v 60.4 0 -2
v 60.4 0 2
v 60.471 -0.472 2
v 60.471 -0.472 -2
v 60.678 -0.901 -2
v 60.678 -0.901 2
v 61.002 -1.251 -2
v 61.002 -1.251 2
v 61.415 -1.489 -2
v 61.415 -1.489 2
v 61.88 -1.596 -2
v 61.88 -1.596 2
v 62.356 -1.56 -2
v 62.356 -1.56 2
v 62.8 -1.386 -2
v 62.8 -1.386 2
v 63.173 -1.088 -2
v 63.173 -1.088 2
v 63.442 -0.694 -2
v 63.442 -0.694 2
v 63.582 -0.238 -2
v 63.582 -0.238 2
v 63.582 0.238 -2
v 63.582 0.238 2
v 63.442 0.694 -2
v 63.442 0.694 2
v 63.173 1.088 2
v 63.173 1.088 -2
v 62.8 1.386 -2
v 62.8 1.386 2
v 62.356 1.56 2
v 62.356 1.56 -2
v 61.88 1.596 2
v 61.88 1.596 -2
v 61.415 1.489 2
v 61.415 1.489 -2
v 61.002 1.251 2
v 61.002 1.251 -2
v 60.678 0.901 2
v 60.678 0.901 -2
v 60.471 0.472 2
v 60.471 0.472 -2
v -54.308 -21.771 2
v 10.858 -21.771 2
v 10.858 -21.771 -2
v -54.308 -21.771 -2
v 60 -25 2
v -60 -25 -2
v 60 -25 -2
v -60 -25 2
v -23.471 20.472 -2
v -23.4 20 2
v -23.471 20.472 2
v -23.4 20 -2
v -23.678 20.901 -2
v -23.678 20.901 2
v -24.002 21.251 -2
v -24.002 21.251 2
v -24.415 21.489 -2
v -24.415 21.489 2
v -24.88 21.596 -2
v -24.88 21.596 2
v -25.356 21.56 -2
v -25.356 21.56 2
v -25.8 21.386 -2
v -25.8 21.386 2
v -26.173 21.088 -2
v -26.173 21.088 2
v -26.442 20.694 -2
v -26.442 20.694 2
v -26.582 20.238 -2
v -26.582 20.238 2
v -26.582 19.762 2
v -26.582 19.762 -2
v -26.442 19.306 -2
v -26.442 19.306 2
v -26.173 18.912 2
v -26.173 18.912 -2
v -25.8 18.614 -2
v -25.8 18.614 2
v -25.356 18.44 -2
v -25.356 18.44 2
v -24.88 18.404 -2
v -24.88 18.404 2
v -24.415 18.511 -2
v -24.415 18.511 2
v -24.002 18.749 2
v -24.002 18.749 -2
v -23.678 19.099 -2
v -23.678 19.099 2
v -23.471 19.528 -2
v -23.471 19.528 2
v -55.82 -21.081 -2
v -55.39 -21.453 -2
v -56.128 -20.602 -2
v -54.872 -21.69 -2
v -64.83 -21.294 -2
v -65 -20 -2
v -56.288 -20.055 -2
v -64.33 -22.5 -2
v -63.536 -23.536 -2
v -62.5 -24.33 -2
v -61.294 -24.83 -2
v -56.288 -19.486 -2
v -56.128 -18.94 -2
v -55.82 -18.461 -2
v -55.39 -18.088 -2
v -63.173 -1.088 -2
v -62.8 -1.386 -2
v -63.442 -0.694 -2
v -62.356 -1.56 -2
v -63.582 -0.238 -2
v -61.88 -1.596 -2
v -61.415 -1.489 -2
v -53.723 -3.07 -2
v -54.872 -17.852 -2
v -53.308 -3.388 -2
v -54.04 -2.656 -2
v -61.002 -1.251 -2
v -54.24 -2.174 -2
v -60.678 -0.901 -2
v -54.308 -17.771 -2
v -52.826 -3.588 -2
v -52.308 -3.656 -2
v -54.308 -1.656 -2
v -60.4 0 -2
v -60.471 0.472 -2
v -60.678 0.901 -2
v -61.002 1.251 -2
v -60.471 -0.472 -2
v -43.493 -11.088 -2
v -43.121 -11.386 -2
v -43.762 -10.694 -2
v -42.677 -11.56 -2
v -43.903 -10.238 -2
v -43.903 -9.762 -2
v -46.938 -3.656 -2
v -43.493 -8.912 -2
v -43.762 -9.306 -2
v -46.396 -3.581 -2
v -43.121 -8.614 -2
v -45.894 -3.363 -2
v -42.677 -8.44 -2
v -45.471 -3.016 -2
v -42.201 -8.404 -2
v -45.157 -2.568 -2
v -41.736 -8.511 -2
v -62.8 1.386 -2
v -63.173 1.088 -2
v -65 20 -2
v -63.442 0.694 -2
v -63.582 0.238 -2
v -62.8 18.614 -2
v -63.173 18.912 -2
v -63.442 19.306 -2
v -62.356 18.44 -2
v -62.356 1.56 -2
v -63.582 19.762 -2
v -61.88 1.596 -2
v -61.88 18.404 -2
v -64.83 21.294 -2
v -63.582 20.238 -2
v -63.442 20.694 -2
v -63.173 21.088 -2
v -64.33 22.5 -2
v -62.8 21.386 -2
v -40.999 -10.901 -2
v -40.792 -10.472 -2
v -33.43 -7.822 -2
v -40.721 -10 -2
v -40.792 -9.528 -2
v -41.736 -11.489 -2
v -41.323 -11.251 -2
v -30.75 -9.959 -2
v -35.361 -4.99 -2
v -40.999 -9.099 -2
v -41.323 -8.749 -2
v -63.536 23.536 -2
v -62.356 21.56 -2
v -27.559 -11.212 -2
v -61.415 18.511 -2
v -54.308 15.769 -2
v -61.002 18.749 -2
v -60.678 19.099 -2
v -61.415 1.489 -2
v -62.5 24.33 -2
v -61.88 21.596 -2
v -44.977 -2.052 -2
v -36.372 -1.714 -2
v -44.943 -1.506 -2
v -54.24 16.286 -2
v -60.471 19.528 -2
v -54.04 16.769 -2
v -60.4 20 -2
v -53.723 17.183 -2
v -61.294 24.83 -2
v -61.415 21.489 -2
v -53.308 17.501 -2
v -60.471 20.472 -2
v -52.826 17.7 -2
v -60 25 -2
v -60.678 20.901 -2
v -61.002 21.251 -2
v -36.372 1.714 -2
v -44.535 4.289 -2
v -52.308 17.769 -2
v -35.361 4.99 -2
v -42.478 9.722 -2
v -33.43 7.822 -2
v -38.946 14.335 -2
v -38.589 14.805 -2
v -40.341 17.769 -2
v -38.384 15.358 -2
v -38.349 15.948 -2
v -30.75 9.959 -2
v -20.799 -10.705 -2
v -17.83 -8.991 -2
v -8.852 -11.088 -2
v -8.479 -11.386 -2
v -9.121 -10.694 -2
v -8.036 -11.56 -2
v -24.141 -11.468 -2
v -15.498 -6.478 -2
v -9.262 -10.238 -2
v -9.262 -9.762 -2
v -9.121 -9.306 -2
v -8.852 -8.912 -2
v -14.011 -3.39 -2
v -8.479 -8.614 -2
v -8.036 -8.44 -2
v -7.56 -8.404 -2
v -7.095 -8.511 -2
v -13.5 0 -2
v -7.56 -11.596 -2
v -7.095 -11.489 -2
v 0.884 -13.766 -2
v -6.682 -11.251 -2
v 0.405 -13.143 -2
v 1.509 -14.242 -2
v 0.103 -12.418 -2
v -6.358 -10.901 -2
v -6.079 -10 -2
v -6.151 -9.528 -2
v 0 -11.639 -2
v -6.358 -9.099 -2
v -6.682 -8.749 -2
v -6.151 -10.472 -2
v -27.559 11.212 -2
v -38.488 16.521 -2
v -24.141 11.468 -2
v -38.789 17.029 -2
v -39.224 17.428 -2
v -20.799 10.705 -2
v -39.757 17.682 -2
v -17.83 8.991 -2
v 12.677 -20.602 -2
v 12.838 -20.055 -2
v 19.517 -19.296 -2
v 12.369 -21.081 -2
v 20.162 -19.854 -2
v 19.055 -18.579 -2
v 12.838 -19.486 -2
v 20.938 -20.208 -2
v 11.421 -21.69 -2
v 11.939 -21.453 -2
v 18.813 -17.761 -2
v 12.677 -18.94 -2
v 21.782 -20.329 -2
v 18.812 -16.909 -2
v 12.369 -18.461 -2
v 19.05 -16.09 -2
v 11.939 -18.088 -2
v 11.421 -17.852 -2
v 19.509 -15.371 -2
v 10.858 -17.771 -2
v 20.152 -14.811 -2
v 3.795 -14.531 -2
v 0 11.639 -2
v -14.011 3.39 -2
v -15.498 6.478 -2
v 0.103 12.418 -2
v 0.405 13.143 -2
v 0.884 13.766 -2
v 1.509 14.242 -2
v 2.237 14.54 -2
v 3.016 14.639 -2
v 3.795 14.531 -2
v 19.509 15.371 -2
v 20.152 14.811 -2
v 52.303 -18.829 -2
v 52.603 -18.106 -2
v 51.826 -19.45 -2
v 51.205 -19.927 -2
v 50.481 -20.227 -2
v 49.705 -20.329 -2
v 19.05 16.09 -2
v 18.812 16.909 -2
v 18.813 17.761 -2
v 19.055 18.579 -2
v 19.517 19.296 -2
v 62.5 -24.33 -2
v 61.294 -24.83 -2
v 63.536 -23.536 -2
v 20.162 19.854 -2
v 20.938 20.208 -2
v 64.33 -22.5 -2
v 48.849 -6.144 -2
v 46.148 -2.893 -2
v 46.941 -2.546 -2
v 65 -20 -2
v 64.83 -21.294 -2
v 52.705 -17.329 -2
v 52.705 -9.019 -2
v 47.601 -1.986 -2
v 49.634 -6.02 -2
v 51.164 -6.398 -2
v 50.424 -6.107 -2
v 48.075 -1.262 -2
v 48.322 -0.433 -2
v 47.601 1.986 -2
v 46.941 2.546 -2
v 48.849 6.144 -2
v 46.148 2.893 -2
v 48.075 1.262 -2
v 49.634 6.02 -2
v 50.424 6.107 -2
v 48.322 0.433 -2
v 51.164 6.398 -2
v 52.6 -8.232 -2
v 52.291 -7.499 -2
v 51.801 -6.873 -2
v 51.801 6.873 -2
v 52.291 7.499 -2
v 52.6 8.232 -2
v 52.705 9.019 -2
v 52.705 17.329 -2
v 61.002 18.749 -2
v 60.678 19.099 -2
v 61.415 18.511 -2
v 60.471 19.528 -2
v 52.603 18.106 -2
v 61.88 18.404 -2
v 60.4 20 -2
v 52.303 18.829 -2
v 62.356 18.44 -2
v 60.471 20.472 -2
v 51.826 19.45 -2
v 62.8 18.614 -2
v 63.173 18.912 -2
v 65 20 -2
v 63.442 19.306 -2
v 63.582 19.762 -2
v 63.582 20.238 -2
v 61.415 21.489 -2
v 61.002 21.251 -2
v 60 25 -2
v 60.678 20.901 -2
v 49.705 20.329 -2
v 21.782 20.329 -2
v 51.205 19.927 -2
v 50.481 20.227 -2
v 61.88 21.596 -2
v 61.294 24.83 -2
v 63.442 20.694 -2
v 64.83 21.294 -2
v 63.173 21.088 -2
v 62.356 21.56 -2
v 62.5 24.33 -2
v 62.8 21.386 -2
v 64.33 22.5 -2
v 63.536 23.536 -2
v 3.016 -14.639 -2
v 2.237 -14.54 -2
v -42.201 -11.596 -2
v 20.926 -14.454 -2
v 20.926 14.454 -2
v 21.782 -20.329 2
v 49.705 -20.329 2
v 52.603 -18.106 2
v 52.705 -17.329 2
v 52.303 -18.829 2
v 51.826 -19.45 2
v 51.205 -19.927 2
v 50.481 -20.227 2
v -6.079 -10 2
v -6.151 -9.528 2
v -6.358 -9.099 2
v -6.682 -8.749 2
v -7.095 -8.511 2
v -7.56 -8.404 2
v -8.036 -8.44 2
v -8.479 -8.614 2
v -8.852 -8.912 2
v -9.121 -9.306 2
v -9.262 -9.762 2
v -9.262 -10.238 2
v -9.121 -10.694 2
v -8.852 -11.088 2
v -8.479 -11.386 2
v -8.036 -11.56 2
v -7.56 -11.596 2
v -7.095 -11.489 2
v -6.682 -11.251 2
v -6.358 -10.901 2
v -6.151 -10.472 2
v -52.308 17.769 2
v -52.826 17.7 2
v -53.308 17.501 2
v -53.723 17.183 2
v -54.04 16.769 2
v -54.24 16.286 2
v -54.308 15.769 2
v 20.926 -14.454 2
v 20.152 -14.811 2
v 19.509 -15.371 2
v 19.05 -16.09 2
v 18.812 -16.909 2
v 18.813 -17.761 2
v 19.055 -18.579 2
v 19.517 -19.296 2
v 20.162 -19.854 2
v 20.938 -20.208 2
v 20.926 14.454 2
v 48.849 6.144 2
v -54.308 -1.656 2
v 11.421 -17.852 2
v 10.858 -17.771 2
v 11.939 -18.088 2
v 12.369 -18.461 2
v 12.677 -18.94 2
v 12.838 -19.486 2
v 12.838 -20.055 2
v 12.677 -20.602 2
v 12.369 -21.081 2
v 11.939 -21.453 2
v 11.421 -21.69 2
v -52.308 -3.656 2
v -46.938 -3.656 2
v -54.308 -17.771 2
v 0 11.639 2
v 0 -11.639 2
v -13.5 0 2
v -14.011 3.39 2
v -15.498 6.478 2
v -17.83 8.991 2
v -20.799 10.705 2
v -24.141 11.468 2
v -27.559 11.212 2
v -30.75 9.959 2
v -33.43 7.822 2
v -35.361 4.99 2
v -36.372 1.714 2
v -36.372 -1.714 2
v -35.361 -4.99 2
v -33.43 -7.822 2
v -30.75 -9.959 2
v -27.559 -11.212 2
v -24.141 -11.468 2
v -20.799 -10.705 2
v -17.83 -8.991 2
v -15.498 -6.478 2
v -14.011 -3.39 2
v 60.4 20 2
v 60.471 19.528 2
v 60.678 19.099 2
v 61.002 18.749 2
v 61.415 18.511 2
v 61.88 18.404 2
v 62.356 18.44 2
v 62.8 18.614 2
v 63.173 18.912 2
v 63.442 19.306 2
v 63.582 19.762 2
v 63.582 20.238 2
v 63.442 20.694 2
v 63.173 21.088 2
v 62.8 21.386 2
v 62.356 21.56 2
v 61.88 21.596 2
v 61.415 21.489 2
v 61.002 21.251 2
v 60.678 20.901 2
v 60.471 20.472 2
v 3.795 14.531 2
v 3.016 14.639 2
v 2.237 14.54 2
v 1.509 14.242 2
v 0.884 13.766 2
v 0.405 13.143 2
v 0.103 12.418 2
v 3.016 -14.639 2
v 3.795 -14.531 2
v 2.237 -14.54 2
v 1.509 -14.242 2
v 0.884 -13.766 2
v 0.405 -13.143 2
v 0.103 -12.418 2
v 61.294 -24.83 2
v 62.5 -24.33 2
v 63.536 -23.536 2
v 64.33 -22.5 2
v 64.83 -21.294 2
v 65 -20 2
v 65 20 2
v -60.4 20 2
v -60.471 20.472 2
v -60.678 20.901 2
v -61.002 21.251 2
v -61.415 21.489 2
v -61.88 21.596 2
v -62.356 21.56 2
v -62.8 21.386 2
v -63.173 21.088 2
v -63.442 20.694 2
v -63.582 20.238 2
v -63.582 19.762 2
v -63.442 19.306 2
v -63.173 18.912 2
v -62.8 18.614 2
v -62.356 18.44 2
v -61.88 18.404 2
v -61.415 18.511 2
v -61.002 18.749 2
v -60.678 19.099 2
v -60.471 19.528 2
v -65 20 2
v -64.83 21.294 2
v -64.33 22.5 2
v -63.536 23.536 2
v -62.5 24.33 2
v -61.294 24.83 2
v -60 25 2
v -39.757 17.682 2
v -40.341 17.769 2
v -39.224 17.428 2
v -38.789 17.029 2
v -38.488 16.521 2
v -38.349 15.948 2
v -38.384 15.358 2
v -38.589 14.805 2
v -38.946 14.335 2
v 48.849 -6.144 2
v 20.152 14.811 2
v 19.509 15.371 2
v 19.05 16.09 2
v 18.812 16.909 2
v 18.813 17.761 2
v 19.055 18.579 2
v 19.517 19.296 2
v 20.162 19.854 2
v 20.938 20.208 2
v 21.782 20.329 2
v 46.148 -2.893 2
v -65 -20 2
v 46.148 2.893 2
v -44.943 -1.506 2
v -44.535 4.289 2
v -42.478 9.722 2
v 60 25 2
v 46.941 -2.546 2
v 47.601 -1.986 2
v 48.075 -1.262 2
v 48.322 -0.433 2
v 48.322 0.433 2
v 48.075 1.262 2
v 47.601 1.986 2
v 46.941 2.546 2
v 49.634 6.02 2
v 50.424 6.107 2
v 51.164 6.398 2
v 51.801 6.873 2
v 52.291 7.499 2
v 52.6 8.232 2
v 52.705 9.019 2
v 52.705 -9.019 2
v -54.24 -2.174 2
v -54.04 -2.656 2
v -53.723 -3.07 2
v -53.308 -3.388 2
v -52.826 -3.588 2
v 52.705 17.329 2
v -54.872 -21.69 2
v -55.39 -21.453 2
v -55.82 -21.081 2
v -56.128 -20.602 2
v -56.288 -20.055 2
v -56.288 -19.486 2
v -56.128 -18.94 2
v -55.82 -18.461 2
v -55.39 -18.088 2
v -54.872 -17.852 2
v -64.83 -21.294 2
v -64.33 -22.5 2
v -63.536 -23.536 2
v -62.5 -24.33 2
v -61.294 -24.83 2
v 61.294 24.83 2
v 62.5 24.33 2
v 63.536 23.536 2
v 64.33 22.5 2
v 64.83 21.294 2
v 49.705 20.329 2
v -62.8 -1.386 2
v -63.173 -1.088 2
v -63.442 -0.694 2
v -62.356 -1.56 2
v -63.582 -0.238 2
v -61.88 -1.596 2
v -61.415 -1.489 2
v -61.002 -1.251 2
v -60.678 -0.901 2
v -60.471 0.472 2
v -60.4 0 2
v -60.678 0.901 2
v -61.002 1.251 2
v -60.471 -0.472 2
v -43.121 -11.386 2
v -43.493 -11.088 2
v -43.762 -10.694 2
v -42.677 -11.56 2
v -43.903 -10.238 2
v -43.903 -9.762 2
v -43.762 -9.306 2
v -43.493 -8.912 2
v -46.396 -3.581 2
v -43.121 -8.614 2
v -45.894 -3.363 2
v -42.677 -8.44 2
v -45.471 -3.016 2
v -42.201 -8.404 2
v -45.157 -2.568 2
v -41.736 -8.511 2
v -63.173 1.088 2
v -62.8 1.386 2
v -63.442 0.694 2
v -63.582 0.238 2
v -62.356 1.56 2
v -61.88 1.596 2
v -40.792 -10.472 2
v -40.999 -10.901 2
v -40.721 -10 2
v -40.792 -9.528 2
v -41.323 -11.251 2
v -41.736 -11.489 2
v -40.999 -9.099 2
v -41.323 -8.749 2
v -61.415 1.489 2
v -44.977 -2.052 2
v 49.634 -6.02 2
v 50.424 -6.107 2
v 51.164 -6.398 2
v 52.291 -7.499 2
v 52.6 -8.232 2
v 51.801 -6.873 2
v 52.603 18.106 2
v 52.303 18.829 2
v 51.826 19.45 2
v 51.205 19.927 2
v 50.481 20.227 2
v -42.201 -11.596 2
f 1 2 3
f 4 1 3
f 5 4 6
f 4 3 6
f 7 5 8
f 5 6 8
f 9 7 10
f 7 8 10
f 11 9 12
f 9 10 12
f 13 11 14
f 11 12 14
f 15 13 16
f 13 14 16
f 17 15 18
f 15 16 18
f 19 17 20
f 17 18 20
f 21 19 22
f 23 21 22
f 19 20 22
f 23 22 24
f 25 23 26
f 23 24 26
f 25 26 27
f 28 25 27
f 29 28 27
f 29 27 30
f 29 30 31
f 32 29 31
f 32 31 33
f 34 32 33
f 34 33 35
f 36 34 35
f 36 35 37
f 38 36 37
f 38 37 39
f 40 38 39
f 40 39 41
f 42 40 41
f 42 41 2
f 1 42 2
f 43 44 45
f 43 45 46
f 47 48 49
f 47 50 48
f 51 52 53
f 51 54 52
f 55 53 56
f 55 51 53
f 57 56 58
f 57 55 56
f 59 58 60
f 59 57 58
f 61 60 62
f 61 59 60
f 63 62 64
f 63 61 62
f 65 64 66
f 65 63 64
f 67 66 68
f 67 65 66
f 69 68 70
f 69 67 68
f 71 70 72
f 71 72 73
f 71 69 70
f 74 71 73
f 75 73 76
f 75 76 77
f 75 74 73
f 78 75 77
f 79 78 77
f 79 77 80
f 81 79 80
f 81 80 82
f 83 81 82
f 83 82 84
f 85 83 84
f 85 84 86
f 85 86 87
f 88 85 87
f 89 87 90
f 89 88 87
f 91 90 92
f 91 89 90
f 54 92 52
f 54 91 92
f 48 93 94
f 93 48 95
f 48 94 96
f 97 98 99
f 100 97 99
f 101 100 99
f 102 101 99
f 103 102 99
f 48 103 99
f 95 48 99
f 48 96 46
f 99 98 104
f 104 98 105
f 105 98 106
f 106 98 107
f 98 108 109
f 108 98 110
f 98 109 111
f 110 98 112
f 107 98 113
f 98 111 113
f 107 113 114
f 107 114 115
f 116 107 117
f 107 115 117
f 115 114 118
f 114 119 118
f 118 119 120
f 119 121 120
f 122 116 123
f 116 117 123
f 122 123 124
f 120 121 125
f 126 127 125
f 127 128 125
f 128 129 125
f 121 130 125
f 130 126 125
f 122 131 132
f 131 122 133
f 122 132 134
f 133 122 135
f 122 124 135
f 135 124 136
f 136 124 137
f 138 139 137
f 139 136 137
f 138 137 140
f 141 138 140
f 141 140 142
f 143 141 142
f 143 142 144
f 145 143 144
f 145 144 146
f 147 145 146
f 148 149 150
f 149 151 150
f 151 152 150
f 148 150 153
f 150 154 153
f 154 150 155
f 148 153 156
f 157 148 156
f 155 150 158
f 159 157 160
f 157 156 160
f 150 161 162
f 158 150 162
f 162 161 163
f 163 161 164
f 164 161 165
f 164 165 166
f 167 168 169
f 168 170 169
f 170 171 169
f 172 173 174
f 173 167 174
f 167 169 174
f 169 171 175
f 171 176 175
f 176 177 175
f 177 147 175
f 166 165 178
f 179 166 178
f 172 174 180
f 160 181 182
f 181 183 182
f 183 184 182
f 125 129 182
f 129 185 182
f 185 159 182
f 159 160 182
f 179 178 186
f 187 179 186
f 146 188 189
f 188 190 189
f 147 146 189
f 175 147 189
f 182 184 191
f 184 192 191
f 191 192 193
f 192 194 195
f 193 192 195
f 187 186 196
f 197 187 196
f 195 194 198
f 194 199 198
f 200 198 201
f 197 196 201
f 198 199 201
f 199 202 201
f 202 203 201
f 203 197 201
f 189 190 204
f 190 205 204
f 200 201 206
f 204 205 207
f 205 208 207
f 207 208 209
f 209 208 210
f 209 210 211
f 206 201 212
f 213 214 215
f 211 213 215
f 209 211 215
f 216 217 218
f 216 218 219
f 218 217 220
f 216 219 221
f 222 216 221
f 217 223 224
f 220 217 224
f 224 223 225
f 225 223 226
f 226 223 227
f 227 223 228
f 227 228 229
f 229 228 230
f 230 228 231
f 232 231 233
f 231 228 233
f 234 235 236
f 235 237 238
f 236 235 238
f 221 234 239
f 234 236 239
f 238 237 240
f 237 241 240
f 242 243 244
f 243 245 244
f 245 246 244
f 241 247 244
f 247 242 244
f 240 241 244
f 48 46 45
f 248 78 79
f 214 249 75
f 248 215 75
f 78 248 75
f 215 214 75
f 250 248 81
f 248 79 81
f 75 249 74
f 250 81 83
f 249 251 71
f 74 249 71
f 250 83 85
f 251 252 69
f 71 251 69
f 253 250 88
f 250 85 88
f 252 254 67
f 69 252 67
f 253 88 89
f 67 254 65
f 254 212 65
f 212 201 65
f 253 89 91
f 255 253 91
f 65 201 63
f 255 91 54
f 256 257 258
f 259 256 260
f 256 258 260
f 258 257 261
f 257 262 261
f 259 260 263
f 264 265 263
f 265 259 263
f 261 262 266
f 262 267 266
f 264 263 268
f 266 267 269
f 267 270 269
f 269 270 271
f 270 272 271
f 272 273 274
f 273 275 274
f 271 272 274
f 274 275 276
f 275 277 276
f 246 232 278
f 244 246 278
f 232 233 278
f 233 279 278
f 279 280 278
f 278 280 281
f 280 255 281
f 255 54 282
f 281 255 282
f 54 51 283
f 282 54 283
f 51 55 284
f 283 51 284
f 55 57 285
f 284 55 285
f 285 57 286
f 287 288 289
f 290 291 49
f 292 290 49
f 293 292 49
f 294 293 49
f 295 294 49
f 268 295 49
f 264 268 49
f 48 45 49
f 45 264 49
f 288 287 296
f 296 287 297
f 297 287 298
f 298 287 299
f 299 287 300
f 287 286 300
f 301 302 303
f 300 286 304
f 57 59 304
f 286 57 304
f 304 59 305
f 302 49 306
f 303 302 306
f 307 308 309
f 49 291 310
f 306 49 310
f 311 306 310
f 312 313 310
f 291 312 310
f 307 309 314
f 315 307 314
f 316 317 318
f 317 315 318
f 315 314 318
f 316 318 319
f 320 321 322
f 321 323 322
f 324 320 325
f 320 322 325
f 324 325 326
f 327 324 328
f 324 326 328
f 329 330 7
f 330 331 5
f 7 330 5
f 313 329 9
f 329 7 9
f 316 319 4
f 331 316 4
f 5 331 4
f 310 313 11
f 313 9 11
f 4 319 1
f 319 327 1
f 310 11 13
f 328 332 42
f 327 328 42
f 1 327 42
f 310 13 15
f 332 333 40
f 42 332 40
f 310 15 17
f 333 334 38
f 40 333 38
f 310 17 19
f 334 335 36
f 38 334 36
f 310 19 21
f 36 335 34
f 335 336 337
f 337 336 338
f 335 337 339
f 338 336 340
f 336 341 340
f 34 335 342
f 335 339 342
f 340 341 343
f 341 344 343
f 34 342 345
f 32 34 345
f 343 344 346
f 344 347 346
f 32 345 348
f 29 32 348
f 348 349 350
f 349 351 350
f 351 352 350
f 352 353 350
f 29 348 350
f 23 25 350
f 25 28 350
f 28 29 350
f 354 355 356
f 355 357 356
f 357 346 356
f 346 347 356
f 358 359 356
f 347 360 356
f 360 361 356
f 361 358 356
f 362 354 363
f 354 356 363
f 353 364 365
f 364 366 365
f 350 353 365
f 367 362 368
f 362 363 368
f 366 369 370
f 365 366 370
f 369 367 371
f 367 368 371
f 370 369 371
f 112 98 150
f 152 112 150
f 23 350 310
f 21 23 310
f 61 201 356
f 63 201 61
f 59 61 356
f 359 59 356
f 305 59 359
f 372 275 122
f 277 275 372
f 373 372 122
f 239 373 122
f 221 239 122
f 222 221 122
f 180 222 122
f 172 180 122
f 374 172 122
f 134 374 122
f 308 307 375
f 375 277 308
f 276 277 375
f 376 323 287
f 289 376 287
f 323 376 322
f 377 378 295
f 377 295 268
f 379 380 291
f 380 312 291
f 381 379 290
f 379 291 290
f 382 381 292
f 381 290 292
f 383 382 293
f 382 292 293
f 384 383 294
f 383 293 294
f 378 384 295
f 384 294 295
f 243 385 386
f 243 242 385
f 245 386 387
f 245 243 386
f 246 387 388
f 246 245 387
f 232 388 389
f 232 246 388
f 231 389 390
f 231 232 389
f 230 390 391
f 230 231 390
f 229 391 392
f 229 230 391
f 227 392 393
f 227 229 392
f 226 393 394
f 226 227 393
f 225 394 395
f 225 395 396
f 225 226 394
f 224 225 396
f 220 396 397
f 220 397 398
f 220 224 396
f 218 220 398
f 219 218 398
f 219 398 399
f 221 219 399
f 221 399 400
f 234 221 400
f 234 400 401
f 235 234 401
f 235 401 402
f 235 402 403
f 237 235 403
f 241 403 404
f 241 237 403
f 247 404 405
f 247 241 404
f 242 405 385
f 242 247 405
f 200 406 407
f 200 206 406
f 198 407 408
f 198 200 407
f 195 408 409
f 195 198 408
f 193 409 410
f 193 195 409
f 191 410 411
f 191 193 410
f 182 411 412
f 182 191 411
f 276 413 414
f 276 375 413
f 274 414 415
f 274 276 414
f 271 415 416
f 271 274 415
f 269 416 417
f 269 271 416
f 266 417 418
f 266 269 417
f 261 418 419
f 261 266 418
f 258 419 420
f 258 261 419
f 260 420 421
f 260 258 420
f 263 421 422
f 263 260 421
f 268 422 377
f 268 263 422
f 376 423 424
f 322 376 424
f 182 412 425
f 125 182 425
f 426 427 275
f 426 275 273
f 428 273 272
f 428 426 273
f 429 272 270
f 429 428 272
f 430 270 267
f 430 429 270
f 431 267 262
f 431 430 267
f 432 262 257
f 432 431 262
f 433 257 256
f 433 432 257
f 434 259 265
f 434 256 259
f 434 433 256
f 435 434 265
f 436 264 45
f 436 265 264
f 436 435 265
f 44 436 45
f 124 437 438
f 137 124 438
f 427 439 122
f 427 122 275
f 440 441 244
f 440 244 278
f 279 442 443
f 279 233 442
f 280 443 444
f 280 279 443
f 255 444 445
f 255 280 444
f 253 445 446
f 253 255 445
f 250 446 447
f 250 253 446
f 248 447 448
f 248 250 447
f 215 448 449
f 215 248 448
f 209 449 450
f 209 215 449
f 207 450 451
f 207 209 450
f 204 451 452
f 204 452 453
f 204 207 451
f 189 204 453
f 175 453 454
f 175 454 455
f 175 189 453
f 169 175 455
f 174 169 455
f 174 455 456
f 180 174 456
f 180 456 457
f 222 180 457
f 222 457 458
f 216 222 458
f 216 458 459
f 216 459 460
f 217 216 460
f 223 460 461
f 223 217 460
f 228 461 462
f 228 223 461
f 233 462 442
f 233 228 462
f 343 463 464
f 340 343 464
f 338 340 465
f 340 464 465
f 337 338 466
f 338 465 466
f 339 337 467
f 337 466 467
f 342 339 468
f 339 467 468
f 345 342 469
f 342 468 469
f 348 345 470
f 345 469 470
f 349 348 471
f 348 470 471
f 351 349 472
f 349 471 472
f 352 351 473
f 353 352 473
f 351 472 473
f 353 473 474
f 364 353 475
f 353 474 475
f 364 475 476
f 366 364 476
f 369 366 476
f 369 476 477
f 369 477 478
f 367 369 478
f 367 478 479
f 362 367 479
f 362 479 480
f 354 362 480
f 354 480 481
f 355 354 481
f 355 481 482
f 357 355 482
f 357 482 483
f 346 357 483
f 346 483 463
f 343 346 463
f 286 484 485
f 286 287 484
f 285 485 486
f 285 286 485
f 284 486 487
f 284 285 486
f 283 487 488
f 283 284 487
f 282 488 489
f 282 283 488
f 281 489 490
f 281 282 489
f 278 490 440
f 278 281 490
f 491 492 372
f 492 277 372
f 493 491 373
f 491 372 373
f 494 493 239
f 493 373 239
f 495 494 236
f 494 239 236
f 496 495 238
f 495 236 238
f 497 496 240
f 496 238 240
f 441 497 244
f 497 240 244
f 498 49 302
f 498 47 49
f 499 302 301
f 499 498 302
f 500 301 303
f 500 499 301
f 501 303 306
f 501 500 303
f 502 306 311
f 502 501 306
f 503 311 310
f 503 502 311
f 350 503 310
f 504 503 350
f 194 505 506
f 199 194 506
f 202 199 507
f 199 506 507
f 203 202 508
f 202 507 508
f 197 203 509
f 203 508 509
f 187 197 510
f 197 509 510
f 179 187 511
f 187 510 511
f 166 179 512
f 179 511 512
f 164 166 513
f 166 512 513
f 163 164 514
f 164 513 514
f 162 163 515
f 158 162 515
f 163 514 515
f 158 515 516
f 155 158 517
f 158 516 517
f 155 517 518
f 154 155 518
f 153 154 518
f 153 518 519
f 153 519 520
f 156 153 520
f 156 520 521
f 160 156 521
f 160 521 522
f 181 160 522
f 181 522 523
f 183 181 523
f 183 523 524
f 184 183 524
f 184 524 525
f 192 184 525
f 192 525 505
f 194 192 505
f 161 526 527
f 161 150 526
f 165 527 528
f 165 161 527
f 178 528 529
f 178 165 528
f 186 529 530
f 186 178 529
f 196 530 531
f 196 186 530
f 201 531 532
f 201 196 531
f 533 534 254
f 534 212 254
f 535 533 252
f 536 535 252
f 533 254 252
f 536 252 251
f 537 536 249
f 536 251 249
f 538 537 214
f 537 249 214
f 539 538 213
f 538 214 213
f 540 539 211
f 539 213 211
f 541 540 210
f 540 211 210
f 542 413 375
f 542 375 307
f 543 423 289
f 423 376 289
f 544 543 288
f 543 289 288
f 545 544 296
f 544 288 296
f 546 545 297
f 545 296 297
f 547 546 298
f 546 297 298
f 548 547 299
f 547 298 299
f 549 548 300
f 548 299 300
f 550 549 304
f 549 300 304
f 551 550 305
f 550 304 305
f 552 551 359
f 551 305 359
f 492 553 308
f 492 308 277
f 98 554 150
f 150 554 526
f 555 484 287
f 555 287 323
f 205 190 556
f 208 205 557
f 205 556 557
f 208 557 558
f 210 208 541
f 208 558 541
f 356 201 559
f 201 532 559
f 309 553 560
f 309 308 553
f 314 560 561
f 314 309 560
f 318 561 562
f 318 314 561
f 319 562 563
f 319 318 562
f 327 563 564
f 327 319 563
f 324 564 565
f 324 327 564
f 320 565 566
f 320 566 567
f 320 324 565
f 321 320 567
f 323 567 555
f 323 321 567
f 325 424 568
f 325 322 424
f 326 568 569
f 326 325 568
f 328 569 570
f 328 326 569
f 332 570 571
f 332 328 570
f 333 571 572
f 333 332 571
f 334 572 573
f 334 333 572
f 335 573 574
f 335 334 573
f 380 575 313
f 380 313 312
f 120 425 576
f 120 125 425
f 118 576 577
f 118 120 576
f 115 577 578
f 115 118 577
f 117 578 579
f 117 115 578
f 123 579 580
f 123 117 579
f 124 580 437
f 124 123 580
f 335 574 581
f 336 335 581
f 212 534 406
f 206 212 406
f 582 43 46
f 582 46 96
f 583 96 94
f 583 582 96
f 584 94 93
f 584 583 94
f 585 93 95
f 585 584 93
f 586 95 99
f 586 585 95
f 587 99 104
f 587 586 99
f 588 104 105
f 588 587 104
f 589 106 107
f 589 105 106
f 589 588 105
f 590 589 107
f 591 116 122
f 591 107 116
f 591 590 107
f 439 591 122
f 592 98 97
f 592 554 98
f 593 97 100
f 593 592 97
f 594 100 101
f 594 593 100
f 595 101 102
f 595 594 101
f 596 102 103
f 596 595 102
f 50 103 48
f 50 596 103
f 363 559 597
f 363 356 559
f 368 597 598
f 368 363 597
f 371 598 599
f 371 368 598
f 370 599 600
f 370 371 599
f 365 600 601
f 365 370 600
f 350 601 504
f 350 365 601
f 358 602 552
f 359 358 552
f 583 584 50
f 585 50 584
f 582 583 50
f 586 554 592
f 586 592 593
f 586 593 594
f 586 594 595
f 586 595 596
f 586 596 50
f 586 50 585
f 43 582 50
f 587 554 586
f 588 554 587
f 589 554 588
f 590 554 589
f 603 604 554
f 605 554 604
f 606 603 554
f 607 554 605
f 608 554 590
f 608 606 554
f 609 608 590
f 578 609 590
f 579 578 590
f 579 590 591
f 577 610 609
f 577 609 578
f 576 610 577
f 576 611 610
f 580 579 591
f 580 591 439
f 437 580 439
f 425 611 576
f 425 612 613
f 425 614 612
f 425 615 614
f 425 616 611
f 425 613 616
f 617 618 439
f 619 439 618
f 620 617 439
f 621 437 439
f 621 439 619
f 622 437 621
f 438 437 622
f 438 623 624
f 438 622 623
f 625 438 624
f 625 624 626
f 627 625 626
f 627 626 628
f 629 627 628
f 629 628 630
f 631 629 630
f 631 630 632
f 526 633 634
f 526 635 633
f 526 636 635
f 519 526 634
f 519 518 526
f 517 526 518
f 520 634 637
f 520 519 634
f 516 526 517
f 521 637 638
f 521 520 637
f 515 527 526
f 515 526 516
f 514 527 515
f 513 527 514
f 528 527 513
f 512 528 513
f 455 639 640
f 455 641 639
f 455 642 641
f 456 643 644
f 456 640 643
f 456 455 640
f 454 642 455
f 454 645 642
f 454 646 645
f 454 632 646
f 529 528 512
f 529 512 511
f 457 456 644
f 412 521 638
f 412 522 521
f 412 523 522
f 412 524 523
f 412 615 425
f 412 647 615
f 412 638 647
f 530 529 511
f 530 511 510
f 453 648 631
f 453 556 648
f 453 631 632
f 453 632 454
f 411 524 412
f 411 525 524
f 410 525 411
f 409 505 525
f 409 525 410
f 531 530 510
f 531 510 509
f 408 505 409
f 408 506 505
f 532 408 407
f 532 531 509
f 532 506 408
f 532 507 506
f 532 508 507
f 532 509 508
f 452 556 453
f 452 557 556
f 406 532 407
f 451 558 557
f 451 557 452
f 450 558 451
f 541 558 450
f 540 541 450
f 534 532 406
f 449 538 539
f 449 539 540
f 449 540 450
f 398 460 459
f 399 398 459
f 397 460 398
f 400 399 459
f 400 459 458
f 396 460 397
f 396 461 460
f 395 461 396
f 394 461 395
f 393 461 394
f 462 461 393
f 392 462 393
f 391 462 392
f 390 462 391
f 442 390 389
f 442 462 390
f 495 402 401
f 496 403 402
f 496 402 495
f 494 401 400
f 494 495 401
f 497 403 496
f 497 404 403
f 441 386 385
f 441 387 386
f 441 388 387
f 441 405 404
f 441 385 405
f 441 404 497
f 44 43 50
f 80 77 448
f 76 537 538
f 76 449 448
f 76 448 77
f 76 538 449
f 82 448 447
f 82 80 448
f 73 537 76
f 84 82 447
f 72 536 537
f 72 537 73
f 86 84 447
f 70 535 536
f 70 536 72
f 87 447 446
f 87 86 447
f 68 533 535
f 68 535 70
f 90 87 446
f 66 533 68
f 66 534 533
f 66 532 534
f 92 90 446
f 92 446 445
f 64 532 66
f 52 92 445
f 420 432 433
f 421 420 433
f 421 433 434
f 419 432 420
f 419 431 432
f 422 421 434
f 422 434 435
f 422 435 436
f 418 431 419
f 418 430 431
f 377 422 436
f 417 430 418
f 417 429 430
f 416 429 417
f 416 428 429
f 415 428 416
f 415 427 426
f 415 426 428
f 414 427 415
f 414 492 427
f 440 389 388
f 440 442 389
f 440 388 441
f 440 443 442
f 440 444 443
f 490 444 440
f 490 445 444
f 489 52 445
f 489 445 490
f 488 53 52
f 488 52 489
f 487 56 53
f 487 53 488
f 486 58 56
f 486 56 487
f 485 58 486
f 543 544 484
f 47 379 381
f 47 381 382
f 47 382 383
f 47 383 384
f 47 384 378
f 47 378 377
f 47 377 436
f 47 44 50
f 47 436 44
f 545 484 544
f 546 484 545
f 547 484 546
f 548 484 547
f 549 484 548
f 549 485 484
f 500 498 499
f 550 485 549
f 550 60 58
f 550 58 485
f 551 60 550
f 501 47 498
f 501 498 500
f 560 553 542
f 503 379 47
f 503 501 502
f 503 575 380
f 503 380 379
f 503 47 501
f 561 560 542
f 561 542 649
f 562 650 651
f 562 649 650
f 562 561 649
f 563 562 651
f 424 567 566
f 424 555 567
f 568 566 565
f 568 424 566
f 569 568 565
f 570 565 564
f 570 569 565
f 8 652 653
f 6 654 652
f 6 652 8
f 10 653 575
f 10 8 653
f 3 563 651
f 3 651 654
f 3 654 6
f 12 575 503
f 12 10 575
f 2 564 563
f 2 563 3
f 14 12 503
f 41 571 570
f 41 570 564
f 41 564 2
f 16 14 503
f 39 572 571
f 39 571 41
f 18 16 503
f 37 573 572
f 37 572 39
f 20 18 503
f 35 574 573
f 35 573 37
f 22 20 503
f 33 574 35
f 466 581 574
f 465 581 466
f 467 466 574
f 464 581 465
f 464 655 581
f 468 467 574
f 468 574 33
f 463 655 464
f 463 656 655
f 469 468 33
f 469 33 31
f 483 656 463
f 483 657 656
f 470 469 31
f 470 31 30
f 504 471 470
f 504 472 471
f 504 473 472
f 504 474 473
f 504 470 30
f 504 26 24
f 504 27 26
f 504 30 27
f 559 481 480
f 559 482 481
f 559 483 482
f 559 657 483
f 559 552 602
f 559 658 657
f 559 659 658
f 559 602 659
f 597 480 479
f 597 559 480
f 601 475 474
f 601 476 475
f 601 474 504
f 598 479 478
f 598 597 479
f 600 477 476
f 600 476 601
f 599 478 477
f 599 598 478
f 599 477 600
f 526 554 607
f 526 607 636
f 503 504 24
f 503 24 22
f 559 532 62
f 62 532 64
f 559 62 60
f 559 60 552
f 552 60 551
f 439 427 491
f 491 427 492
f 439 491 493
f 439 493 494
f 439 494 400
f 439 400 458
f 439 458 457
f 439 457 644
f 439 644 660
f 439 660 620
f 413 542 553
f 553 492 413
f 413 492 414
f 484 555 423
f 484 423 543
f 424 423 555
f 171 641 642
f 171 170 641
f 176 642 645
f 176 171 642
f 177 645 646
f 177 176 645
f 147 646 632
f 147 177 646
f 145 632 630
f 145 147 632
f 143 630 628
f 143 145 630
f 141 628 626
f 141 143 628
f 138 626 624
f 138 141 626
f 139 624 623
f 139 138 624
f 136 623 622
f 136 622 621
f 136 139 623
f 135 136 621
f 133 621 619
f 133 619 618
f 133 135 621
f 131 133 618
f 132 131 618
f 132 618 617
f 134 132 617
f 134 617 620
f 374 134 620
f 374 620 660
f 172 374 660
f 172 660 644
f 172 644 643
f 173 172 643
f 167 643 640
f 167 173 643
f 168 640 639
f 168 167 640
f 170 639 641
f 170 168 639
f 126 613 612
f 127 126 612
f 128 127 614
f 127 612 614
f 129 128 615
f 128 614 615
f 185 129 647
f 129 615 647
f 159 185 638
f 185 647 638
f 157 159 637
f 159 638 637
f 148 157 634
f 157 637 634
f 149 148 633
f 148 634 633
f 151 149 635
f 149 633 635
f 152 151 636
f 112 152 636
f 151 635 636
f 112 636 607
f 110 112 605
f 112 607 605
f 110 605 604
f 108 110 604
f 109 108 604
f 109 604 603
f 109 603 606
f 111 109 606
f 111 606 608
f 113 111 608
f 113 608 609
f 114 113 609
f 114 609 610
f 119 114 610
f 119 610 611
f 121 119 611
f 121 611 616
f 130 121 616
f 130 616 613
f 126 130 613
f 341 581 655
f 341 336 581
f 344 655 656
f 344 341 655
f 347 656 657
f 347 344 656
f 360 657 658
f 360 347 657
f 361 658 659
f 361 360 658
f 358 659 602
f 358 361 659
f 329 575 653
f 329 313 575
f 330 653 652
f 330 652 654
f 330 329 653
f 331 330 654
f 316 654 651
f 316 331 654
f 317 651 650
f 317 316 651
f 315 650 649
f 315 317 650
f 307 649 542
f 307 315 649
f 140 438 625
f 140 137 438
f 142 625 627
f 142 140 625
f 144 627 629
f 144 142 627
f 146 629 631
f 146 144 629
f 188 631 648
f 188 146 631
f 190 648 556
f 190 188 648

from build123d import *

# Parameters (mm, degrees)
SKETCH_1_W          = 130
SKETCH_1_H          = 50
SKETCH_1_R          = 11.5
SKETCH_1_R_2        = 1.6
EXTRUDE_1_DEPTH     = 2
SKETCH_2_R          = 1.6
CUT_EXTRUDE_1_DEPTH = 70.756720106
FILLET_1_R          = 5
CUT_EXTRUDE_2_DEPTH = 70.756720106
FILLET_2_R          = 3
CUT_EXTRUDE_3_DEPTH = 70.756720106
FILLET_3_R          = 2


with BuildPart() as part:
    # 草图1 → 凸台-拉伸1 (new, symmetric)
    with BuildSketch(Plane.XY):
        Rectangle(SKETCH_1_W, SKETCH_1_H)
        with Locations((-25, 0)):
            Circle(SKETCH_1_R, mode=Mode.SUBTRACT)
        with Locations((-25, 20)):
            Circle(SKETCH_1_R_2, mode=Mode.SUBTRACT)
        with Locations((-7.679491924, -10)):
            Circle(SKETCH_1_R_2, mode=Mode.SUBTRACT)
        with Locations((-42.320508076, -10)):
            Circle(SKETCH_1_R_2, mode=Mode.SUBTRACT)
    extrude(amount=EXTRUDE_1_DEPTH, both=True)

    # 草图2 → 切除-拉伸1 (cut, through all)
    with BuildSketch(Plane.XY.offset(2)):
        with Locations((-62, 0)):
            Circle(SKETCH_2_R)
        with Locations((-62, 20)):
            Circle(SKETCH_2_R)
        with Locations(Location((62, 0, 0), (0, 0, 180))):
            Circle(SKETCH_2_R)
        with Locations(Location((62, 20, 0), (0, 0, 180))):
            Circle(SKETCH_2_R)
    extrude(amount=-CUT_EXTRUDE_1_DEPTH, mode=Mode.SUBTRACT)

    # 圆角1
    fillet_1_edges = [part.edges().sort_by_distance(p)[0] for p in [
        (65, -25, 0),
        (-65, -25, 0),
        (-65, 25, 0),
        (65, 25, 0),
    ]]
    fillet(fillet_1_edges, radius=FILLET_1_R)

    # 草图3 → 切除-拉伸2 (cut, through all)
    with BuildSketch(Plane.XY.offset(2)):
        Polygon((0, -15.574230951), (0, 15.574230951), (56.674910039, 0), align=None)
        Polygon((52.704928418, -20.329043818), (1.183129779, -20.329043818), (52.704928418, -4.996701006), align=None)
        Polygon((1.183129779, 20.329043818), (52.704928418, 4.996701006), (52.704928418, 20.329043818), align=None)
    extrude(amount=-CUT_EXTRUDE_2_DEPTH, mode=Mode.SUBTRACT)

    # 圆角2
    fillet_2_edges = [part.edges().sort_by_distance(p)[0] for p in [
        (1.183129779, 20.329043818, 0),
        (52.704928418, 20.329043818, 0),
        (52.704928418, 4.996701006, 0),
        (52.704928418, -4.996701006, 0),
        (52.704928418, -20.329043818, 0),
        (1.183129779, -20.329043818, 0),
        (56.674910039, 0, 0),
        (0, -15.574230951, 0),
        (0, 15.574230951, 0),
    ]]
    fillet(fillet_2_edges, radius=FILLET_2_R)

    # 草图4 → 切除-拉伸3 (cut, through all)
    with BuildSketch(Plane.XY.offset(2)):
        with BuildLine():
            Line((-34.180193003, 17.76862562), (-54.308419113, 17.76862562))
            Line((-54.308419113, 17.76862562), (-54.308419113, -3.656277433))
            Line((-54.308419113, -3.656277433), (-44.66295083, -3.656277433))
            ThreePointArc((-44.66295083, -3.656277433), (-42.964920101, 8.789860395), (-34.180193003, 17.76862562))
        make_face()
        with BuildLine():
            Line((-54.308419113, -17.77082873), (10.857927113, -17.77082873))
            ThreePointArc((10.857927113, -17.77082873), (12.857927113, -19.77082873), (10.857927113, -21.77082873))
            Line((10.857927113, -21.77082873), (-54.308419113, -21.77082873))
            ThreePointArc((-54.308419113, -21.77082873), (-56.308419113, -19.77082873), (-54.308419113, -17.77082873))
        make_face()
    extrude(amount=-CUT_EXTRUDE_3_DEPTH, mode=Mode.SUBTRACT)

    # 圆角3
    fillet_3_edges = [part.edges().sort_by_distance(p)[0] for p in [
        (-34.180193003, 17.76862562, 0),
        (-44.66295083, -3.656277433, 0),
        (-54.308419113, -3.656277433, 0),
        (-54.308419113, 17.76862562, 0),
    ]]
    fillet(fillet_3_edges, radius=FILLET_3_R)


solid = part.part
